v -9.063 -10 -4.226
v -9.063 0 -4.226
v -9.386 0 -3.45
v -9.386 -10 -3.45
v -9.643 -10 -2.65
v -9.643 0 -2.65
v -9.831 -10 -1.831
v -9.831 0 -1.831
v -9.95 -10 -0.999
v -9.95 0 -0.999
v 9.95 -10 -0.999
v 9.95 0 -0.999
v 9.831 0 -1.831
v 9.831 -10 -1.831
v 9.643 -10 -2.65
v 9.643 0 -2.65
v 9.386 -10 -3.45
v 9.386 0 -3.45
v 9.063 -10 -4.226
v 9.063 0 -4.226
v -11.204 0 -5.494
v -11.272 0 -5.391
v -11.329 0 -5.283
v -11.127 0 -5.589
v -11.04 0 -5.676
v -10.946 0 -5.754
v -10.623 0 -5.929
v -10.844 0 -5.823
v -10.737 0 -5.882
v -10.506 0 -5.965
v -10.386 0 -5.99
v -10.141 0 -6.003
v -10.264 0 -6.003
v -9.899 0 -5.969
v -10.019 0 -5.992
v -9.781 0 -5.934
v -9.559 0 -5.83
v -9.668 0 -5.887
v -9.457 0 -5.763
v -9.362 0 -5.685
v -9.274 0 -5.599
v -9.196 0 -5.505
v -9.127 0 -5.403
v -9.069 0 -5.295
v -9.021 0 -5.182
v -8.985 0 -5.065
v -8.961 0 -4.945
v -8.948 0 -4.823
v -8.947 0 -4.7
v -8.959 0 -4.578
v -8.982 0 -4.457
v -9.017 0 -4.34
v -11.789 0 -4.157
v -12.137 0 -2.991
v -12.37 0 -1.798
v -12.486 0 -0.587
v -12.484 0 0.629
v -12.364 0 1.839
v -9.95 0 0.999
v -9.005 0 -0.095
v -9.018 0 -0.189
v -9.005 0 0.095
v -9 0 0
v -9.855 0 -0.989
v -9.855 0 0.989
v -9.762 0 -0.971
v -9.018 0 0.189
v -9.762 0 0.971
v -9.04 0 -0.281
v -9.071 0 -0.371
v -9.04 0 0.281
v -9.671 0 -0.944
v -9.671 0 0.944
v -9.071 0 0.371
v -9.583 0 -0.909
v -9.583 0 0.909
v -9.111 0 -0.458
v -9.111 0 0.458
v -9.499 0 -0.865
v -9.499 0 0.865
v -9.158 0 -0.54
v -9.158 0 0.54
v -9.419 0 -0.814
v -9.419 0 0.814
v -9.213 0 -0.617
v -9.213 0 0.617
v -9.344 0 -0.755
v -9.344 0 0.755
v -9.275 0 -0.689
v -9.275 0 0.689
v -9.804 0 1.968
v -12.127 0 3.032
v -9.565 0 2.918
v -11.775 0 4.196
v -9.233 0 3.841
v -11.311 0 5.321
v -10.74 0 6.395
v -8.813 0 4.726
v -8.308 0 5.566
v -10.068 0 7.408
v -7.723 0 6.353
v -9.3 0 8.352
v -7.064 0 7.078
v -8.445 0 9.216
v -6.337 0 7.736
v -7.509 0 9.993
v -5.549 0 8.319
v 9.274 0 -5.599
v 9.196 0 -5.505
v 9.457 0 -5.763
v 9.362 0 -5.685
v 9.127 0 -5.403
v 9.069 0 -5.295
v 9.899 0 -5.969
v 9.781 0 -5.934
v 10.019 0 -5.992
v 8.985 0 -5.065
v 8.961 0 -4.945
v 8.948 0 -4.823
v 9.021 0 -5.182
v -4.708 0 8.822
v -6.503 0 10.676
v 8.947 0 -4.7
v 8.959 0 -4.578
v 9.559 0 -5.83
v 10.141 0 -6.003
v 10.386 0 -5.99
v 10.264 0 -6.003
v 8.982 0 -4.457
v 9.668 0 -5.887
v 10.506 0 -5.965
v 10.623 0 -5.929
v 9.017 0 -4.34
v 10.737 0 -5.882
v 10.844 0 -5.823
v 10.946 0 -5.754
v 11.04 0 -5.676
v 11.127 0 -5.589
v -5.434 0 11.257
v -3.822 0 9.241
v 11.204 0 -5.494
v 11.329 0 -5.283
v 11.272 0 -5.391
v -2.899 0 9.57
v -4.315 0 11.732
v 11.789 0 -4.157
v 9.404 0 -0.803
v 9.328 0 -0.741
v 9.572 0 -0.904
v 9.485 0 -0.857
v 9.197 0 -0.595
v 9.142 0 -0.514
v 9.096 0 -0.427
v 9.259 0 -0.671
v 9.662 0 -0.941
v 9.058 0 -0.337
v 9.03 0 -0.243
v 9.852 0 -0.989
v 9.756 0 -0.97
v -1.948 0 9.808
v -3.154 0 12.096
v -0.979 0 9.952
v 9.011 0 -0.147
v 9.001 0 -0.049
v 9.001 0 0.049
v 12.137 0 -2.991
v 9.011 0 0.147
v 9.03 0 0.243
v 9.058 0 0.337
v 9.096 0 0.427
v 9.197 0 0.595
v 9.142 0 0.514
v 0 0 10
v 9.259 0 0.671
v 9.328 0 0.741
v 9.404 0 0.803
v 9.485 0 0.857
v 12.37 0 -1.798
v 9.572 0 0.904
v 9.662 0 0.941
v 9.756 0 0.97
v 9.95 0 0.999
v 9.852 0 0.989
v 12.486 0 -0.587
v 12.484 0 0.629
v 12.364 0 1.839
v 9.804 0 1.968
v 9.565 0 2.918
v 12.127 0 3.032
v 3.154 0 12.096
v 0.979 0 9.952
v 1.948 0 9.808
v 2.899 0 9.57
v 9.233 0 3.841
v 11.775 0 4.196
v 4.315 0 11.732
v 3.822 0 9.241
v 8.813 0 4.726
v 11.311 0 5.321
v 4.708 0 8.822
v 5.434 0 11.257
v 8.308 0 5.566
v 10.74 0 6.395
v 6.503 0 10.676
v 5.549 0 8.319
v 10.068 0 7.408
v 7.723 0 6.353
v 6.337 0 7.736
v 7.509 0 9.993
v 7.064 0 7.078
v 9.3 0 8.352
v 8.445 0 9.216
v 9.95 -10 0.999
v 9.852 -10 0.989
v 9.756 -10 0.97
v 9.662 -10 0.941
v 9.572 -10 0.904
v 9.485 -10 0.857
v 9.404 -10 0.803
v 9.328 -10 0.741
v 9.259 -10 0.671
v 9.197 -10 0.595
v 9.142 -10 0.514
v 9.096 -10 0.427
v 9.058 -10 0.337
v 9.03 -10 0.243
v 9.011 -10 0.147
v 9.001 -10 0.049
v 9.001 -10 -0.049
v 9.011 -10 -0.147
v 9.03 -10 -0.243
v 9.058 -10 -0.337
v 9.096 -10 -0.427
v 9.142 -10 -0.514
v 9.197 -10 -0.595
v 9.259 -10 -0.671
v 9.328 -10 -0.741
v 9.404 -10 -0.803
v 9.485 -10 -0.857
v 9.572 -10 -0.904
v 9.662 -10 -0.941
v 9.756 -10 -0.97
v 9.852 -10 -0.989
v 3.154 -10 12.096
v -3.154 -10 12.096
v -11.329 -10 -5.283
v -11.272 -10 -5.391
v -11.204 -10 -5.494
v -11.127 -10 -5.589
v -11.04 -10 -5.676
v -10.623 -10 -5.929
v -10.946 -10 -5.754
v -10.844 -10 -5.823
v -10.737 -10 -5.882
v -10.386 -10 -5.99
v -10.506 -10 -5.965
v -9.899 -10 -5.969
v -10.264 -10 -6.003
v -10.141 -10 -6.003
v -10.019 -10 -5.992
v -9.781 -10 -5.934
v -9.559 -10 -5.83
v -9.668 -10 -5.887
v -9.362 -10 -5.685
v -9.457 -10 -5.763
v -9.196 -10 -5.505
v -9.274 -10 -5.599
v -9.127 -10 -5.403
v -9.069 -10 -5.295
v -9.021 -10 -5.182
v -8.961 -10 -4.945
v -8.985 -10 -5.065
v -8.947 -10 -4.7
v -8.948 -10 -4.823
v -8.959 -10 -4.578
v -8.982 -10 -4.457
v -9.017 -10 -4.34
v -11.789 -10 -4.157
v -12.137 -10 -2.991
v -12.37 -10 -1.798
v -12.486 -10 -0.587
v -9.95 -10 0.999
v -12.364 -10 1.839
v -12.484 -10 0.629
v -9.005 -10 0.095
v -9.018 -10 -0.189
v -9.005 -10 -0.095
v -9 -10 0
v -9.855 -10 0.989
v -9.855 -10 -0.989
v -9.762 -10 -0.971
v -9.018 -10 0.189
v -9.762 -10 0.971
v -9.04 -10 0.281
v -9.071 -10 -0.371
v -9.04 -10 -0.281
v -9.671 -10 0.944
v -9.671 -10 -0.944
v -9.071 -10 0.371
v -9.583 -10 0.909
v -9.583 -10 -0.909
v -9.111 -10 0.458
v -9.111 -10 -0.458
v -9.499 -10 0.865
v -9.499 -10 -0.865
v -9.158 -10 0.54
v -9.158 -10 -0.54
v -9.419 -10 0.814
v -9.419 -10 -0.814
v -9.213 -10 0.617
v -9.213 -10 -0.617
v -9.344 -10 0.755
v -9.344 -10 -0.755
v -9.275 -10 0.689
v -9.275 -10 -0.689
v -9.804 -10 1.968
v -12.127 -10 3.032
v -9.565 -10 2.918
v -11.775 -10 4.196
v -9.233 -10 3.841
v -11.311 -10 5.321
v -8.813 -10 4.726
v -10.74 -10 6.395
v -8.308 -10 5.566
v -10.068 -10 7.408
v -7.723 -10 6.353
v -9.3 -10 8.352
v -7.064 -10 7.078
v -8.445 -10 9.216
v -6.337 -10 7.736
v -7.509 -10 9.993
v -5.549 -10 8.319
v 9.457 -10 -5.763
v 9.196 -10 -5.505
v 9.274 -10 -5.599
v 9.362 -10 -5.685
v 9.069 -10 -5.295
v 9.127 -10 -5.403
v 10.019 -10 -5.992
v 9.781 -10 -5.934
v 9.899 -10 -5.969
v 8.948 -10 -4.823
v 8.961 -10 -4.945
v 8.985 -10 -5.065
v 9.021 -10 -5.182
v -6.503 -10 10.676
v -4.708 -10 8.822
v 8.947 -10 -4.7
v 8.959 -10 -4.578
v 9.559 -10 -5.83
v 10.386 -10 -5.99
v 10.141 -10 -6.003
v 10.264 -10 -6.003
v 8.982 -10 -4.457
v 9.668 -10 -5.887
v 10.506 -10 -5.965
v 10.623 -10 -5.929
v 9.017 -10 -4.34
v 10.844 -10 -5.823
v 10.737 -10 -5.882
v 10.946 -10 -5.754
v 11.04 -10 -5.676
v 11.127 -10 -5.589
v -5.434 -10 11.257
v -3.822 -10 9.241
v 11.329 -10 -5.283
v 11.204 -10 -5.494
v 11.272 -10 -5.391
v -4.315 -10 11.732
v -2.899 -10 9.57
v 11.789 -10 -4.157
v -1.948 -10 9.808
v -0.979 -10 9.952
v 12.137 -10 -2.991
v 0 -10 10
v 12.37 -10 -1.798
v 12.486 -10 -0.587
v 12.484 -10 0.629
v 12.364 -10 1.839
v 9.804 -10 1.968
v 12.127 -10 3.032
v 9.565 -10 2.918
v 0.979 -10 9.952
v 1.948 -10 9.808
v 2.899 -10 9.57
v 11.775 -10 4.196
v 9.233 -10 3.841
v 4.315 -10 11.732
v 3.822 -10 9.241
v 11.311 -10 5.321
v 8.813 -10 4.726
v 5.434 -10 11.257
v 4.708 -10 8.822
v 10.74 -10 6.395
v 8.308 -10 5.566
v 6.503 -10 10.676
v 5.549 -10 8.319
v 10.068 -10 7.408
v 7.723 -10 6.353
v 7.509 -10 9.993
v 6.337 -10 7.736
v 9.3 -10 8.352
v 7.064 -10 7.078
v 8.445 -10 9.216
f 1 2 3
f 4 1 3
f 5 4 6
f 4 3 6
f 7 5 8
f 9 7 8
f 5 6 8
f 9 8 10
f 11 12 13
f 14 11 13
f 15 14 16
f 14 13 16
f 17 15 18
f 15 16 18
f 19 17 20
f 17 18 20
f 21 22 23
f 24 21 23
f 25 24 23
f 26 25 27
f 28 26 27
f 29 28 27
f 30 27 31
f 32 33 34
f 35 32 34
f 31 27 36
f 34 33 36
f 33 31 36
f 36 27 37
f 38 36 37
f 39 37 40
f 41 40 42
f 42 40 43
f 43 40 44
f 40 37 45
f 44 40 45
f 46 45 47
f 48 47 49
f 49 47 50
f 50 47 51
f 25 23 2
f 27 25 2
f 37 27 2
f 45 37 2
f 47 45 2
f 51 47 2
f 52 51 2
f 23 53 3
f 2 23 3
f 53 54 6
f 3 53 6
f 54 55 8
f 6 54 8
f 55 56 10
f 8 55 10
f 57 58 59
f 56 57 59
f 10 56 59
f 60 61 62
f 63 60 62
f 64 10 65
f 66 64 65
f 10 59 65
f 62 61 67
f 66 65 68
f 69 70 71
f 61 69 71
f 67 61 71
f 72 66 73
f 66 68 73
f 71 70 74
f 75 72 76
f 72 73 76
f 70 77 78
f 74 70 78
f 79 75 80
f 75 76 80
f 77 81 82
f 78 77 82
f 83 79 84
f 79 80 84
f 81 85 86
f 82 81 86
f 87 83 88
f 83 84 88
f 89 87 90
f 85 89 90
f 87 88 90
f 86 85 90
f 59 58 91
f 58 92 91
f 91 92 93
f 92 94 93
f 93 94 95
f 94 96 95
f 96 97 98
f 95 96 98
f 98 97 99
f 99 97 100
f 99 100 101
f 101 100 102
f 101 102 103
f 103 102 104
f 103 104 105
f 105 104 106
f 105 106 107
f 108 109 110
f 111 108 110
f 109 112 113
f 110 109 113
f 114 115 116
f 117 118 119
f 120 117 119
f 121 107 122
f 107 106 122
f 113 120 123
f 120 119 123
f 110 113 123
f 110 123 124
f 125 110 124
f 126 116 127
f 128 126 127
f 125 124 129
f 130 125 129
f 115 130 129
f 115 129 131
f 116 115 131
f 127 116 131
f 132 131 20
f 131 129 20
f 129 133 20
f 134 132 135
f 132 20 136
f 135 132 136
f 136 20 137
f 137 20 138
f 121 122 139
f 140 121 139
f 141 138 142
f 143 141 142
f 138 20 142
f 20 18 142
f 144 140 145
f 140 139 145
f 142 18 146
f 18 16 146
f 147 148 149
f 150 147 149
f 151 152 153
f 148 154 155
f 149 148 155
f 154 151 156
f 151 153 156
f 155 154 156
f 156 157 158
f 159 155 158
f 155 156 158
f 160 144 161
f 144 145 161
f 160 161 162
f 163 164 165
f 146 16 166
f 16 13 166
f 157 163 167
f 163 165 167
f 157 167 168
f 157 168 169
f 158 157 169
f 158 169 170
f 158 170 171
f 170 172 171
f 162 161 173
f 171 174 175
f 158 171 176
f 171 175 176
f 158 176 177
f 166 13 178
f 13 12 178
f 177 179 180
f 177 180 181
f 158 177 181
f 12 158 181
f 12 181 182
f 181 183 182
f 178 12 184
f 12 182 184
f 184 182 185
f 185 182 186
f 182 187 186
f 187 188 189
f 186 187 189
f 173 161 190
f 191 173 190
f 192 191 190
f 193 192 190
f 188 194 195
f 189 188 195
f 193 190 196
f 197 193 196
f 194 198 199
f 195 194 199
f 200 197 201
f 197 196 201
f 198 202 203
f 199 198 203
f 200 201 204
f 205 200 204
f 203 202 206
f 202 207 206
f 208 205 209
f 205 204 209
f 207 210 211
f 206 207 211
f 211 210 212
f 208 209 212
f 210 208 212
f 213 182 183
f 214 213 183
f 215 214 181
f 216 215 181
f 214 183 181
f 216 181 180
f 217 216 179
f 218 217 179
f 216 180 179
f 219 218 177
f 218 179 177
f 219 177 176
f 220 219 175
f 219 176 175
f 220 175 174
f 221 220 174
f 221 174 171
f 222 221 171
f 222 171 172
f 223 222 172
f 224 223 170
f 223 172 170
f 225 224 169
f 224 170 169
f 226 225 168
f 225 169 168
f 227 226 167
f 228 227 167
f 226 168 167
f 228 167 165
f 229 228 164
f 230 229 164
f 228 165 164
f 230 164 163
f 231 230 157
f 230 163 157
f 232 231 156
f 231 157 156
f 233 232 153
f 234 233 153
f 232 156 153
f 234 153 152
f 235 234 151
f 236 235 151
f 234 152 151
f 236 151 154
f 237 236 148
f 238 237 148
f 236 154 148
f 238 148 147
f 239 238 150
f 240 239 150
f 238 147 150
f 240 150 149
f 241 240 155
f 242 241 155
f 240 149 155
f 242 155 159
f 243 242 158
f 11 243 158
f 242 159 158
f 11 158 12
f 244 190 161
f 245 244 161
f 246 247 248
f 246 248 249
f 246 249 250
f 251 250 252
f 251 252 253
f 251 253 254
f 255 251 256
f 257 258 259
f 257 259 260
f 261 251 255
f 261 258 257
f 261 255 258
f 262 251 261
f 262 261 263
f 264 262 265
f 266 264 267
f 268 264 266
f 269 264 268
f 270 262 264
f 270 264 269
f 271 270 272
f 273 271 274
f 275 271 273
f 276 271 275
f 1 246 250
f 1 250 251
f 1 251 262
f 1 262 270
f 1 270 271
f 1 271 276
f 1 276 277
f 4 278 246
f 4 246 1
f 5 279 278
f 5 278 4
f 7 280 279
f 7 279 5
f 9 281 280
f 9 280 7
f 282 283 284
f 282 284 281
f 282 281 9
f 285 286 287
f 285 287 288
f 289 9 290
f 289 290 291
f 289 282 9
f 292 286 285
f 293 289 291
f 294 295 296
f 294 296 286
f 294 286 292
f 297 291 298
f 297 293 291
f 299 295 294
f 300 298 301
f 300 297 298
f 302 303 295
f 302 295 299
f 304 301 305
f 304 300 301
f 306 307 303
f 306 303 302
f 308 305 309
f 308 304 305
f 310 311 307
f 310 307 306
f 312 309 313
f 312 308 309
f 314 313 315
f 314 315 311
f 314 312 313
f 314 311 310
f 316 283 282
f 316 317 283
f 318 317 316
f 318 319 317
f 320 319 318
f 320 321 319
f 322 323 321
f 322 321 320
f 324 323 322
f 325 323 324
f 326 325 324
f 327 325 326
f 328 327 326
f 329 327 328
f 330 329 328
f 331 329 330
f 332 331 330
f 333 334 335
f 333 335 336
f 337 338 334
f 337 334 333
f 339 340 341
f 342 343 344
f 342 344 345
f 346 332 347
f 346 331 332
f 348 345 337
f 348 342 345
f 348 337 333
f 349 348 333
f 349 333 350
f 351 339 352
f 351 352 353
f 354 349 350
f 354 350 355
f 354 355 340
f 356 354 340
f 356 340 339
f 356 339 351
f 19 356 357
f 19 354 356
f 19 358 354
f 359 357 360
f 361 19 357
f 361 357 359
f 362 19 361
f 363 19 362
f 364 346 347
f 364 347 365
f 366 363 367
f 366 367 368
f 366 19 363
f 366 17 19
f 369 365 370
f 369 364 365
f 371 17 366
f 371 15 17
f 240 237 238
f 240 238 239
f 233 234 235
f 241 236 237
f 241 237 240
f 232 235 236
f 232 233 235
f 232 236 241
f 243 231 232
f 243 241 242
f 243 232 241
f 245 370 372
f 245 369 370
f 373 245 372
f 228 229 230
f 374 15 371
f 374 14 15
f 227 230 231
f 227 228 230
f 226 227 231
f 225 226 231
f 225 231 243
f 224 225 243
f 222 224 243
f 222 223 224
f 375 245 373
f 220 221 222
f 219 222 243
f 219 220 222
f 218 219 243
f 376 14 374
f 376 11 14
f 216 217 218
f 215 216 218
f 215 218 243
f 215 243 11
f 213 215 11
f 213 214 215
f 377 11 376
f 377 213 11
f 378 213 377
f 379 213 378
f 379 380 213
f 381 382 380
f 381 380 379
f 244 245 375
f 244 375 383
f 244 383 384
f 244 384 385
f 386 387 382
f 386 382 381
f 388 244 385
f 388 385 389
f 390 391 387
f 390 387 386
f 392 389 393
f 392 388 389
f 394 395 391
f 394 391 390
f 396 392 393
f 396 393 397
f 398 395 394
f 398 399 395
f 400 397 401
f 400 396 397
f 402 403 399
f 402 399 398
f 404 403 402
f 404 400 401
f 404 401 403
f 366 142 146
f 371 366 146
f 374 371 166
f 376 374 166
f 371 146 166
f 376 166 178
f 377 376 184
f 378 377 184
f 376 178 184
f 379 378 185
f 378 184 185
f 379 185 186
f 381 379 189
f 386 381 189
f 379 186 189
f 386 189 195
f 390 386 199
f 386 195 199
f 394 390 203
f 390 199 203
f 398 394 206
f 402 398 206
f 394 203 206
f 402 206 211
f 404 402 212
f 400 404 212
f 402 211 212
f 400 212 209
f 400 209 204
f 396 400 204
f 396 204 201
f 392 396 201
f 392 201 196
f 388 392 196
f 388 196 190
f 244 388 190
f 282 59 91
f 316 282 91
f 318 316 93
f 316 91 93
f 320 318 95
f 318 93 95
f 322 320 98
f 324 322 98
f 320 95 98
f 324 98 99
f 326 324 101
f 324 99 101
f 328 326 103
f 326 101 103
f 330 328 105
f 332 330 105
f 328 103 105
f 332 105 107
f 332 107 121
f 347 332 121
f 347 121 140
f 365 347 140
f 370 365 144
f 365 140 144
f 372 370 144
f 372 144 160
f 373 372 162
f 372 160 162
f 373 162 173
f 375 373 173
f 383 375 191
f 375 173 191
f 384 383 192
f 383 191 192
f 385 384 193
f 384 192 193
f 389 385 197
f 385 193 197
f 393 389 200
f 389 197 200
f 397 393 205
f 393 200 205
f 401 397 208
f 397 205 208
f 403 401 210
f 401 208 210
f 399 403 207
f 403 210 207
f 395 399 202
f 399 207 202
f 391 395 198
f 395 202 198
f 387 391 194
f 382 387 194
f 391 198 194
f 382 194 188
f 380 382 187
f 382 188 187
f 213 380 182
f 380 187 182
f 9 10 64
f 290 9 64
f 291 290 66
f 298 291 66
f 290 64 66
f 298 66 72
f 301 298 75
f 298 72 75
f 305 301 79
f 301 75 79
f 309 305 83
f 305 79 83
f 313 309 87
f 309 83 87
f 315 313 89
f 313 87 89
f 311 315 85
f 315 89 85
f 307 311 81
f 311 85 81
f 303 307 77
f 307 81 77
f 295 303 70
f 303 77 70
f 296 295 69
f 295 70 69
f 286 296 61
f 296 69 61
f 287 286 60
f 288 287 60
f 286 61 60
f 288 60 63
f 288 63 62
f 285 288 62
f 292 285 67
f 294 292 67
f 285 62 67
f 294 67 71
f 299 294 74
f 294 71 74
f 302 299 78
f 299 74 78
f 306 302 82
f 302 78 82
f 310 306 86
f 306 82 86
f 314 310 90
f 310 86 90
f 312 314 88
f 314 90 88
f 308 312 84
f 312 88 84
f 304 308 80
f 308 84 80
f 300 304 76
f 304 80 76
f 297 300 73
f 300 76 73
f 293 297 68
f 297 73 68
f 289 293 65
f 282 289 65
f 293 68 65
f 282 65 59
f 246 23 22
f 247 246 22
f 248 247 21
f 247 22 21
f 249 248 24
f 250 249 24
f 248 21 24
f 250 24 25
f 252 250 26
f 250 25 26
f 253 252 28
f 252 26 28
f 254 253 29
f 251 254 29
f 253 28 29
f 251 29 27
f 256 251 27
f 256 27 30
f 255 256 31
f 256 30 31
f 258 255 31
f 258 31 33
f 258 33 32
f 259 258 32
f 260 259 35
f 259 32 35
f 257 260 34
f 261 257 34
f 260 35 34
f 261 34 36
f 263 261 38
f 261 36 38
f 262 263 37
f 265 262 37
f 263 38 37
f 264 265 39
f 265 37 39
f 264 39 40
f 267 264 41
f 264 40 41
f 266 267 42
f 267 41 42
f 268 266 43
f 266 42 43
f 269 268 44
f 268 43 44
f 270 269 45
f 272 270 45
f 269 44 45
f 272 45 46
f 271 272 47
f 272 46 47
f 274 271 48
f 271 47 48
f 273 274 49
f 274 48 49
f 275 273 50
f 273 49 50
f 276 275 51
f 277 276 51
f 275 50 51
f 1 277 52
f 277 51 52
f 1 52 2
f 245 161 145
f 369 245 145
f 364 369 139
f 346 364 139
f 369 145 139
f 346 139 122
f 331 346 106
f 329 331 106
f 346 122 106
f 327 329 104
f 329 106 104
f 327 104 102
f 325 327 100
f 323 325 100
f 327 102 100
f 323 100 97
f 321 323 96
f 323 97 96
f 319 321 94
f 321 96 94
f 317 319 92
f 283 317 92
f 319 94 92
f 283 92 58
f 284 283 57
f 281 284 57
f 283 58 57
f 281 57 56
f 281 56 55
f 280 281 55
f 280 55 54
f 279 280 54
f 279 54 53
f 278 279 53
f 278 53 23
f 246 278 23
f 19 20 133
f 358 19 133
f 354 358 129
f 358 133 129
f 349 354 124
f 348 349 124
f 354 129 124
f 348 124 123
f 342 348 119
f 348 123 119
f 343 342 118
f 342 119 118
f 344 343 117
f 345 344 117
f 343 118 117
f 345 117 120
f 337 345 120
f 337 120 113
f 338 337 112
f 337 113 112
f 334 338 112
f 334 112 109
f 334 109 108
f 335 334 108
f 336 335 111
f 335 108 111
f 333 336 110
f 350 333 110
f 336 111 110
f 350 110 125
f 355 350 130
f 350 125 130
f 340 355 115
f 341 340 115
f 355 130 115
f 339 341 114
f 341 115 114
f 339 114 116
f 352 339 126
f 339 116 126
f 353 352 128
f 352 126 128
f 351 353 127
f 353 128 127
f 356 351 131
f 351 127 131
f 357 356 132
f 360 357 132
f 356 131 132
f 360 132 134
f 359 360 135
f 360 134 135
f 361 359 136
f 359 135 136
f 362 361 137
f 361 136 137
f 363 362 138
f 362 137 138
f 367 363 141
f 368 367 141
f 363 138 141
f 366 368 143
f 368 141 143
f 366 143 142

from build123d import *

# Parameters (mm, degrees)
F1_DEPTH = 10


with BuildPart() as f1:
    # F0 (on Front) → F1 (new body)
    with BuildSketch(Plane.XZ):
        with BuildLine():
            ThreePointArc((-9.95, 0.9987492178), (-10, 0), (-9.95, -0.9987492178))
            ThreePointArc((-9.95, -0.9987492178), (-9.2754311627, -0.6892024376), (-9, 0))
            ThreePointArc((-9, 0), (-9.2754311627, 0.6892024376), (-9.95, 0.9987492178))
        make_face()
        with BuildLine():
            ThreePointArc((9.95, -0.9987492178), (10, 0), (9.95, 0.9987492178))
            ThreePointArc((9.95, 0.9987492178), (9, 0), (9.95, -0.9987492178))
        make_face()
        with BuildLine():
            ThreePointArc((-9.95, 0.9987492178), (-11, 0), (-9.95, -0.9987492178))
            ThreePointArc((-9.95, -0.9987492178), (-10, 0), (-9.95, 0.9987492178))
        make_face()
        with BuildLine():
            ThreePointArc((11, 0), (10.6892024376, 0.7245688373), (9.95, 0.9987492178))
            ThreePointArc((9.95, 0.9987492178), (10, 0), (9.95, -0.9987492178))
            ThreePointArc((9.95, -0.9987492178), (10.6892024376, -0.7245688373), (11, 0))
        make_face()
        with BuildLine():
            ThreePointArc((-11.328847338, -5.2827282718), (-9.667689777, -5.8873401784), (-9.0630778704, -4.2261826174))
            ThreePointArc((-9.0630778704, -4.2261826174), (-9.6425289273, -2.6498369547), (-9.95, -0.9987492178))
            ThreePointArc((-9.95, -0.9987492178), (-11, 0), (-9.95, 0.9987492178))
            ThreePointArc((-9.95, 0.9987492178), (0, 10), (9.95, 0.9987492178))
            ThreePointArc((9.95, 0.9987492178), (10.6892024376, 0.7245688373), (11, 0))
            ThreePointArc((11, 0), (10.6892024376, -0.7245688373), (9.95, -0.9987492178))
            ThreePointArc((9.95, -0.9987492178), (9.6425289273, -2.6498369547), (9.0630778704, -4.2261826174))
            ThreePointArc((9.0630778704, -4.2261826174), (9.667689777, -5.8873401784), (11.328847338, -5.2827282718))
            ThreePointArc((11.328847338, -5.2827282718), (11.3110273164, 5.3207763577), (3.1539999452, 12.0955481209))
            Line((3.1539999452, 12.0955481209), (-3.1539999452, 12.0955481209))
            ThreePointArc((-3.1539999452, 12.0955481209), (-11.3110273164, 5.3207763577), (-11.328847338, -5.2827282718))
        make_face()
    extrude(amount=F1_DEPTH)


solid = f1.part
